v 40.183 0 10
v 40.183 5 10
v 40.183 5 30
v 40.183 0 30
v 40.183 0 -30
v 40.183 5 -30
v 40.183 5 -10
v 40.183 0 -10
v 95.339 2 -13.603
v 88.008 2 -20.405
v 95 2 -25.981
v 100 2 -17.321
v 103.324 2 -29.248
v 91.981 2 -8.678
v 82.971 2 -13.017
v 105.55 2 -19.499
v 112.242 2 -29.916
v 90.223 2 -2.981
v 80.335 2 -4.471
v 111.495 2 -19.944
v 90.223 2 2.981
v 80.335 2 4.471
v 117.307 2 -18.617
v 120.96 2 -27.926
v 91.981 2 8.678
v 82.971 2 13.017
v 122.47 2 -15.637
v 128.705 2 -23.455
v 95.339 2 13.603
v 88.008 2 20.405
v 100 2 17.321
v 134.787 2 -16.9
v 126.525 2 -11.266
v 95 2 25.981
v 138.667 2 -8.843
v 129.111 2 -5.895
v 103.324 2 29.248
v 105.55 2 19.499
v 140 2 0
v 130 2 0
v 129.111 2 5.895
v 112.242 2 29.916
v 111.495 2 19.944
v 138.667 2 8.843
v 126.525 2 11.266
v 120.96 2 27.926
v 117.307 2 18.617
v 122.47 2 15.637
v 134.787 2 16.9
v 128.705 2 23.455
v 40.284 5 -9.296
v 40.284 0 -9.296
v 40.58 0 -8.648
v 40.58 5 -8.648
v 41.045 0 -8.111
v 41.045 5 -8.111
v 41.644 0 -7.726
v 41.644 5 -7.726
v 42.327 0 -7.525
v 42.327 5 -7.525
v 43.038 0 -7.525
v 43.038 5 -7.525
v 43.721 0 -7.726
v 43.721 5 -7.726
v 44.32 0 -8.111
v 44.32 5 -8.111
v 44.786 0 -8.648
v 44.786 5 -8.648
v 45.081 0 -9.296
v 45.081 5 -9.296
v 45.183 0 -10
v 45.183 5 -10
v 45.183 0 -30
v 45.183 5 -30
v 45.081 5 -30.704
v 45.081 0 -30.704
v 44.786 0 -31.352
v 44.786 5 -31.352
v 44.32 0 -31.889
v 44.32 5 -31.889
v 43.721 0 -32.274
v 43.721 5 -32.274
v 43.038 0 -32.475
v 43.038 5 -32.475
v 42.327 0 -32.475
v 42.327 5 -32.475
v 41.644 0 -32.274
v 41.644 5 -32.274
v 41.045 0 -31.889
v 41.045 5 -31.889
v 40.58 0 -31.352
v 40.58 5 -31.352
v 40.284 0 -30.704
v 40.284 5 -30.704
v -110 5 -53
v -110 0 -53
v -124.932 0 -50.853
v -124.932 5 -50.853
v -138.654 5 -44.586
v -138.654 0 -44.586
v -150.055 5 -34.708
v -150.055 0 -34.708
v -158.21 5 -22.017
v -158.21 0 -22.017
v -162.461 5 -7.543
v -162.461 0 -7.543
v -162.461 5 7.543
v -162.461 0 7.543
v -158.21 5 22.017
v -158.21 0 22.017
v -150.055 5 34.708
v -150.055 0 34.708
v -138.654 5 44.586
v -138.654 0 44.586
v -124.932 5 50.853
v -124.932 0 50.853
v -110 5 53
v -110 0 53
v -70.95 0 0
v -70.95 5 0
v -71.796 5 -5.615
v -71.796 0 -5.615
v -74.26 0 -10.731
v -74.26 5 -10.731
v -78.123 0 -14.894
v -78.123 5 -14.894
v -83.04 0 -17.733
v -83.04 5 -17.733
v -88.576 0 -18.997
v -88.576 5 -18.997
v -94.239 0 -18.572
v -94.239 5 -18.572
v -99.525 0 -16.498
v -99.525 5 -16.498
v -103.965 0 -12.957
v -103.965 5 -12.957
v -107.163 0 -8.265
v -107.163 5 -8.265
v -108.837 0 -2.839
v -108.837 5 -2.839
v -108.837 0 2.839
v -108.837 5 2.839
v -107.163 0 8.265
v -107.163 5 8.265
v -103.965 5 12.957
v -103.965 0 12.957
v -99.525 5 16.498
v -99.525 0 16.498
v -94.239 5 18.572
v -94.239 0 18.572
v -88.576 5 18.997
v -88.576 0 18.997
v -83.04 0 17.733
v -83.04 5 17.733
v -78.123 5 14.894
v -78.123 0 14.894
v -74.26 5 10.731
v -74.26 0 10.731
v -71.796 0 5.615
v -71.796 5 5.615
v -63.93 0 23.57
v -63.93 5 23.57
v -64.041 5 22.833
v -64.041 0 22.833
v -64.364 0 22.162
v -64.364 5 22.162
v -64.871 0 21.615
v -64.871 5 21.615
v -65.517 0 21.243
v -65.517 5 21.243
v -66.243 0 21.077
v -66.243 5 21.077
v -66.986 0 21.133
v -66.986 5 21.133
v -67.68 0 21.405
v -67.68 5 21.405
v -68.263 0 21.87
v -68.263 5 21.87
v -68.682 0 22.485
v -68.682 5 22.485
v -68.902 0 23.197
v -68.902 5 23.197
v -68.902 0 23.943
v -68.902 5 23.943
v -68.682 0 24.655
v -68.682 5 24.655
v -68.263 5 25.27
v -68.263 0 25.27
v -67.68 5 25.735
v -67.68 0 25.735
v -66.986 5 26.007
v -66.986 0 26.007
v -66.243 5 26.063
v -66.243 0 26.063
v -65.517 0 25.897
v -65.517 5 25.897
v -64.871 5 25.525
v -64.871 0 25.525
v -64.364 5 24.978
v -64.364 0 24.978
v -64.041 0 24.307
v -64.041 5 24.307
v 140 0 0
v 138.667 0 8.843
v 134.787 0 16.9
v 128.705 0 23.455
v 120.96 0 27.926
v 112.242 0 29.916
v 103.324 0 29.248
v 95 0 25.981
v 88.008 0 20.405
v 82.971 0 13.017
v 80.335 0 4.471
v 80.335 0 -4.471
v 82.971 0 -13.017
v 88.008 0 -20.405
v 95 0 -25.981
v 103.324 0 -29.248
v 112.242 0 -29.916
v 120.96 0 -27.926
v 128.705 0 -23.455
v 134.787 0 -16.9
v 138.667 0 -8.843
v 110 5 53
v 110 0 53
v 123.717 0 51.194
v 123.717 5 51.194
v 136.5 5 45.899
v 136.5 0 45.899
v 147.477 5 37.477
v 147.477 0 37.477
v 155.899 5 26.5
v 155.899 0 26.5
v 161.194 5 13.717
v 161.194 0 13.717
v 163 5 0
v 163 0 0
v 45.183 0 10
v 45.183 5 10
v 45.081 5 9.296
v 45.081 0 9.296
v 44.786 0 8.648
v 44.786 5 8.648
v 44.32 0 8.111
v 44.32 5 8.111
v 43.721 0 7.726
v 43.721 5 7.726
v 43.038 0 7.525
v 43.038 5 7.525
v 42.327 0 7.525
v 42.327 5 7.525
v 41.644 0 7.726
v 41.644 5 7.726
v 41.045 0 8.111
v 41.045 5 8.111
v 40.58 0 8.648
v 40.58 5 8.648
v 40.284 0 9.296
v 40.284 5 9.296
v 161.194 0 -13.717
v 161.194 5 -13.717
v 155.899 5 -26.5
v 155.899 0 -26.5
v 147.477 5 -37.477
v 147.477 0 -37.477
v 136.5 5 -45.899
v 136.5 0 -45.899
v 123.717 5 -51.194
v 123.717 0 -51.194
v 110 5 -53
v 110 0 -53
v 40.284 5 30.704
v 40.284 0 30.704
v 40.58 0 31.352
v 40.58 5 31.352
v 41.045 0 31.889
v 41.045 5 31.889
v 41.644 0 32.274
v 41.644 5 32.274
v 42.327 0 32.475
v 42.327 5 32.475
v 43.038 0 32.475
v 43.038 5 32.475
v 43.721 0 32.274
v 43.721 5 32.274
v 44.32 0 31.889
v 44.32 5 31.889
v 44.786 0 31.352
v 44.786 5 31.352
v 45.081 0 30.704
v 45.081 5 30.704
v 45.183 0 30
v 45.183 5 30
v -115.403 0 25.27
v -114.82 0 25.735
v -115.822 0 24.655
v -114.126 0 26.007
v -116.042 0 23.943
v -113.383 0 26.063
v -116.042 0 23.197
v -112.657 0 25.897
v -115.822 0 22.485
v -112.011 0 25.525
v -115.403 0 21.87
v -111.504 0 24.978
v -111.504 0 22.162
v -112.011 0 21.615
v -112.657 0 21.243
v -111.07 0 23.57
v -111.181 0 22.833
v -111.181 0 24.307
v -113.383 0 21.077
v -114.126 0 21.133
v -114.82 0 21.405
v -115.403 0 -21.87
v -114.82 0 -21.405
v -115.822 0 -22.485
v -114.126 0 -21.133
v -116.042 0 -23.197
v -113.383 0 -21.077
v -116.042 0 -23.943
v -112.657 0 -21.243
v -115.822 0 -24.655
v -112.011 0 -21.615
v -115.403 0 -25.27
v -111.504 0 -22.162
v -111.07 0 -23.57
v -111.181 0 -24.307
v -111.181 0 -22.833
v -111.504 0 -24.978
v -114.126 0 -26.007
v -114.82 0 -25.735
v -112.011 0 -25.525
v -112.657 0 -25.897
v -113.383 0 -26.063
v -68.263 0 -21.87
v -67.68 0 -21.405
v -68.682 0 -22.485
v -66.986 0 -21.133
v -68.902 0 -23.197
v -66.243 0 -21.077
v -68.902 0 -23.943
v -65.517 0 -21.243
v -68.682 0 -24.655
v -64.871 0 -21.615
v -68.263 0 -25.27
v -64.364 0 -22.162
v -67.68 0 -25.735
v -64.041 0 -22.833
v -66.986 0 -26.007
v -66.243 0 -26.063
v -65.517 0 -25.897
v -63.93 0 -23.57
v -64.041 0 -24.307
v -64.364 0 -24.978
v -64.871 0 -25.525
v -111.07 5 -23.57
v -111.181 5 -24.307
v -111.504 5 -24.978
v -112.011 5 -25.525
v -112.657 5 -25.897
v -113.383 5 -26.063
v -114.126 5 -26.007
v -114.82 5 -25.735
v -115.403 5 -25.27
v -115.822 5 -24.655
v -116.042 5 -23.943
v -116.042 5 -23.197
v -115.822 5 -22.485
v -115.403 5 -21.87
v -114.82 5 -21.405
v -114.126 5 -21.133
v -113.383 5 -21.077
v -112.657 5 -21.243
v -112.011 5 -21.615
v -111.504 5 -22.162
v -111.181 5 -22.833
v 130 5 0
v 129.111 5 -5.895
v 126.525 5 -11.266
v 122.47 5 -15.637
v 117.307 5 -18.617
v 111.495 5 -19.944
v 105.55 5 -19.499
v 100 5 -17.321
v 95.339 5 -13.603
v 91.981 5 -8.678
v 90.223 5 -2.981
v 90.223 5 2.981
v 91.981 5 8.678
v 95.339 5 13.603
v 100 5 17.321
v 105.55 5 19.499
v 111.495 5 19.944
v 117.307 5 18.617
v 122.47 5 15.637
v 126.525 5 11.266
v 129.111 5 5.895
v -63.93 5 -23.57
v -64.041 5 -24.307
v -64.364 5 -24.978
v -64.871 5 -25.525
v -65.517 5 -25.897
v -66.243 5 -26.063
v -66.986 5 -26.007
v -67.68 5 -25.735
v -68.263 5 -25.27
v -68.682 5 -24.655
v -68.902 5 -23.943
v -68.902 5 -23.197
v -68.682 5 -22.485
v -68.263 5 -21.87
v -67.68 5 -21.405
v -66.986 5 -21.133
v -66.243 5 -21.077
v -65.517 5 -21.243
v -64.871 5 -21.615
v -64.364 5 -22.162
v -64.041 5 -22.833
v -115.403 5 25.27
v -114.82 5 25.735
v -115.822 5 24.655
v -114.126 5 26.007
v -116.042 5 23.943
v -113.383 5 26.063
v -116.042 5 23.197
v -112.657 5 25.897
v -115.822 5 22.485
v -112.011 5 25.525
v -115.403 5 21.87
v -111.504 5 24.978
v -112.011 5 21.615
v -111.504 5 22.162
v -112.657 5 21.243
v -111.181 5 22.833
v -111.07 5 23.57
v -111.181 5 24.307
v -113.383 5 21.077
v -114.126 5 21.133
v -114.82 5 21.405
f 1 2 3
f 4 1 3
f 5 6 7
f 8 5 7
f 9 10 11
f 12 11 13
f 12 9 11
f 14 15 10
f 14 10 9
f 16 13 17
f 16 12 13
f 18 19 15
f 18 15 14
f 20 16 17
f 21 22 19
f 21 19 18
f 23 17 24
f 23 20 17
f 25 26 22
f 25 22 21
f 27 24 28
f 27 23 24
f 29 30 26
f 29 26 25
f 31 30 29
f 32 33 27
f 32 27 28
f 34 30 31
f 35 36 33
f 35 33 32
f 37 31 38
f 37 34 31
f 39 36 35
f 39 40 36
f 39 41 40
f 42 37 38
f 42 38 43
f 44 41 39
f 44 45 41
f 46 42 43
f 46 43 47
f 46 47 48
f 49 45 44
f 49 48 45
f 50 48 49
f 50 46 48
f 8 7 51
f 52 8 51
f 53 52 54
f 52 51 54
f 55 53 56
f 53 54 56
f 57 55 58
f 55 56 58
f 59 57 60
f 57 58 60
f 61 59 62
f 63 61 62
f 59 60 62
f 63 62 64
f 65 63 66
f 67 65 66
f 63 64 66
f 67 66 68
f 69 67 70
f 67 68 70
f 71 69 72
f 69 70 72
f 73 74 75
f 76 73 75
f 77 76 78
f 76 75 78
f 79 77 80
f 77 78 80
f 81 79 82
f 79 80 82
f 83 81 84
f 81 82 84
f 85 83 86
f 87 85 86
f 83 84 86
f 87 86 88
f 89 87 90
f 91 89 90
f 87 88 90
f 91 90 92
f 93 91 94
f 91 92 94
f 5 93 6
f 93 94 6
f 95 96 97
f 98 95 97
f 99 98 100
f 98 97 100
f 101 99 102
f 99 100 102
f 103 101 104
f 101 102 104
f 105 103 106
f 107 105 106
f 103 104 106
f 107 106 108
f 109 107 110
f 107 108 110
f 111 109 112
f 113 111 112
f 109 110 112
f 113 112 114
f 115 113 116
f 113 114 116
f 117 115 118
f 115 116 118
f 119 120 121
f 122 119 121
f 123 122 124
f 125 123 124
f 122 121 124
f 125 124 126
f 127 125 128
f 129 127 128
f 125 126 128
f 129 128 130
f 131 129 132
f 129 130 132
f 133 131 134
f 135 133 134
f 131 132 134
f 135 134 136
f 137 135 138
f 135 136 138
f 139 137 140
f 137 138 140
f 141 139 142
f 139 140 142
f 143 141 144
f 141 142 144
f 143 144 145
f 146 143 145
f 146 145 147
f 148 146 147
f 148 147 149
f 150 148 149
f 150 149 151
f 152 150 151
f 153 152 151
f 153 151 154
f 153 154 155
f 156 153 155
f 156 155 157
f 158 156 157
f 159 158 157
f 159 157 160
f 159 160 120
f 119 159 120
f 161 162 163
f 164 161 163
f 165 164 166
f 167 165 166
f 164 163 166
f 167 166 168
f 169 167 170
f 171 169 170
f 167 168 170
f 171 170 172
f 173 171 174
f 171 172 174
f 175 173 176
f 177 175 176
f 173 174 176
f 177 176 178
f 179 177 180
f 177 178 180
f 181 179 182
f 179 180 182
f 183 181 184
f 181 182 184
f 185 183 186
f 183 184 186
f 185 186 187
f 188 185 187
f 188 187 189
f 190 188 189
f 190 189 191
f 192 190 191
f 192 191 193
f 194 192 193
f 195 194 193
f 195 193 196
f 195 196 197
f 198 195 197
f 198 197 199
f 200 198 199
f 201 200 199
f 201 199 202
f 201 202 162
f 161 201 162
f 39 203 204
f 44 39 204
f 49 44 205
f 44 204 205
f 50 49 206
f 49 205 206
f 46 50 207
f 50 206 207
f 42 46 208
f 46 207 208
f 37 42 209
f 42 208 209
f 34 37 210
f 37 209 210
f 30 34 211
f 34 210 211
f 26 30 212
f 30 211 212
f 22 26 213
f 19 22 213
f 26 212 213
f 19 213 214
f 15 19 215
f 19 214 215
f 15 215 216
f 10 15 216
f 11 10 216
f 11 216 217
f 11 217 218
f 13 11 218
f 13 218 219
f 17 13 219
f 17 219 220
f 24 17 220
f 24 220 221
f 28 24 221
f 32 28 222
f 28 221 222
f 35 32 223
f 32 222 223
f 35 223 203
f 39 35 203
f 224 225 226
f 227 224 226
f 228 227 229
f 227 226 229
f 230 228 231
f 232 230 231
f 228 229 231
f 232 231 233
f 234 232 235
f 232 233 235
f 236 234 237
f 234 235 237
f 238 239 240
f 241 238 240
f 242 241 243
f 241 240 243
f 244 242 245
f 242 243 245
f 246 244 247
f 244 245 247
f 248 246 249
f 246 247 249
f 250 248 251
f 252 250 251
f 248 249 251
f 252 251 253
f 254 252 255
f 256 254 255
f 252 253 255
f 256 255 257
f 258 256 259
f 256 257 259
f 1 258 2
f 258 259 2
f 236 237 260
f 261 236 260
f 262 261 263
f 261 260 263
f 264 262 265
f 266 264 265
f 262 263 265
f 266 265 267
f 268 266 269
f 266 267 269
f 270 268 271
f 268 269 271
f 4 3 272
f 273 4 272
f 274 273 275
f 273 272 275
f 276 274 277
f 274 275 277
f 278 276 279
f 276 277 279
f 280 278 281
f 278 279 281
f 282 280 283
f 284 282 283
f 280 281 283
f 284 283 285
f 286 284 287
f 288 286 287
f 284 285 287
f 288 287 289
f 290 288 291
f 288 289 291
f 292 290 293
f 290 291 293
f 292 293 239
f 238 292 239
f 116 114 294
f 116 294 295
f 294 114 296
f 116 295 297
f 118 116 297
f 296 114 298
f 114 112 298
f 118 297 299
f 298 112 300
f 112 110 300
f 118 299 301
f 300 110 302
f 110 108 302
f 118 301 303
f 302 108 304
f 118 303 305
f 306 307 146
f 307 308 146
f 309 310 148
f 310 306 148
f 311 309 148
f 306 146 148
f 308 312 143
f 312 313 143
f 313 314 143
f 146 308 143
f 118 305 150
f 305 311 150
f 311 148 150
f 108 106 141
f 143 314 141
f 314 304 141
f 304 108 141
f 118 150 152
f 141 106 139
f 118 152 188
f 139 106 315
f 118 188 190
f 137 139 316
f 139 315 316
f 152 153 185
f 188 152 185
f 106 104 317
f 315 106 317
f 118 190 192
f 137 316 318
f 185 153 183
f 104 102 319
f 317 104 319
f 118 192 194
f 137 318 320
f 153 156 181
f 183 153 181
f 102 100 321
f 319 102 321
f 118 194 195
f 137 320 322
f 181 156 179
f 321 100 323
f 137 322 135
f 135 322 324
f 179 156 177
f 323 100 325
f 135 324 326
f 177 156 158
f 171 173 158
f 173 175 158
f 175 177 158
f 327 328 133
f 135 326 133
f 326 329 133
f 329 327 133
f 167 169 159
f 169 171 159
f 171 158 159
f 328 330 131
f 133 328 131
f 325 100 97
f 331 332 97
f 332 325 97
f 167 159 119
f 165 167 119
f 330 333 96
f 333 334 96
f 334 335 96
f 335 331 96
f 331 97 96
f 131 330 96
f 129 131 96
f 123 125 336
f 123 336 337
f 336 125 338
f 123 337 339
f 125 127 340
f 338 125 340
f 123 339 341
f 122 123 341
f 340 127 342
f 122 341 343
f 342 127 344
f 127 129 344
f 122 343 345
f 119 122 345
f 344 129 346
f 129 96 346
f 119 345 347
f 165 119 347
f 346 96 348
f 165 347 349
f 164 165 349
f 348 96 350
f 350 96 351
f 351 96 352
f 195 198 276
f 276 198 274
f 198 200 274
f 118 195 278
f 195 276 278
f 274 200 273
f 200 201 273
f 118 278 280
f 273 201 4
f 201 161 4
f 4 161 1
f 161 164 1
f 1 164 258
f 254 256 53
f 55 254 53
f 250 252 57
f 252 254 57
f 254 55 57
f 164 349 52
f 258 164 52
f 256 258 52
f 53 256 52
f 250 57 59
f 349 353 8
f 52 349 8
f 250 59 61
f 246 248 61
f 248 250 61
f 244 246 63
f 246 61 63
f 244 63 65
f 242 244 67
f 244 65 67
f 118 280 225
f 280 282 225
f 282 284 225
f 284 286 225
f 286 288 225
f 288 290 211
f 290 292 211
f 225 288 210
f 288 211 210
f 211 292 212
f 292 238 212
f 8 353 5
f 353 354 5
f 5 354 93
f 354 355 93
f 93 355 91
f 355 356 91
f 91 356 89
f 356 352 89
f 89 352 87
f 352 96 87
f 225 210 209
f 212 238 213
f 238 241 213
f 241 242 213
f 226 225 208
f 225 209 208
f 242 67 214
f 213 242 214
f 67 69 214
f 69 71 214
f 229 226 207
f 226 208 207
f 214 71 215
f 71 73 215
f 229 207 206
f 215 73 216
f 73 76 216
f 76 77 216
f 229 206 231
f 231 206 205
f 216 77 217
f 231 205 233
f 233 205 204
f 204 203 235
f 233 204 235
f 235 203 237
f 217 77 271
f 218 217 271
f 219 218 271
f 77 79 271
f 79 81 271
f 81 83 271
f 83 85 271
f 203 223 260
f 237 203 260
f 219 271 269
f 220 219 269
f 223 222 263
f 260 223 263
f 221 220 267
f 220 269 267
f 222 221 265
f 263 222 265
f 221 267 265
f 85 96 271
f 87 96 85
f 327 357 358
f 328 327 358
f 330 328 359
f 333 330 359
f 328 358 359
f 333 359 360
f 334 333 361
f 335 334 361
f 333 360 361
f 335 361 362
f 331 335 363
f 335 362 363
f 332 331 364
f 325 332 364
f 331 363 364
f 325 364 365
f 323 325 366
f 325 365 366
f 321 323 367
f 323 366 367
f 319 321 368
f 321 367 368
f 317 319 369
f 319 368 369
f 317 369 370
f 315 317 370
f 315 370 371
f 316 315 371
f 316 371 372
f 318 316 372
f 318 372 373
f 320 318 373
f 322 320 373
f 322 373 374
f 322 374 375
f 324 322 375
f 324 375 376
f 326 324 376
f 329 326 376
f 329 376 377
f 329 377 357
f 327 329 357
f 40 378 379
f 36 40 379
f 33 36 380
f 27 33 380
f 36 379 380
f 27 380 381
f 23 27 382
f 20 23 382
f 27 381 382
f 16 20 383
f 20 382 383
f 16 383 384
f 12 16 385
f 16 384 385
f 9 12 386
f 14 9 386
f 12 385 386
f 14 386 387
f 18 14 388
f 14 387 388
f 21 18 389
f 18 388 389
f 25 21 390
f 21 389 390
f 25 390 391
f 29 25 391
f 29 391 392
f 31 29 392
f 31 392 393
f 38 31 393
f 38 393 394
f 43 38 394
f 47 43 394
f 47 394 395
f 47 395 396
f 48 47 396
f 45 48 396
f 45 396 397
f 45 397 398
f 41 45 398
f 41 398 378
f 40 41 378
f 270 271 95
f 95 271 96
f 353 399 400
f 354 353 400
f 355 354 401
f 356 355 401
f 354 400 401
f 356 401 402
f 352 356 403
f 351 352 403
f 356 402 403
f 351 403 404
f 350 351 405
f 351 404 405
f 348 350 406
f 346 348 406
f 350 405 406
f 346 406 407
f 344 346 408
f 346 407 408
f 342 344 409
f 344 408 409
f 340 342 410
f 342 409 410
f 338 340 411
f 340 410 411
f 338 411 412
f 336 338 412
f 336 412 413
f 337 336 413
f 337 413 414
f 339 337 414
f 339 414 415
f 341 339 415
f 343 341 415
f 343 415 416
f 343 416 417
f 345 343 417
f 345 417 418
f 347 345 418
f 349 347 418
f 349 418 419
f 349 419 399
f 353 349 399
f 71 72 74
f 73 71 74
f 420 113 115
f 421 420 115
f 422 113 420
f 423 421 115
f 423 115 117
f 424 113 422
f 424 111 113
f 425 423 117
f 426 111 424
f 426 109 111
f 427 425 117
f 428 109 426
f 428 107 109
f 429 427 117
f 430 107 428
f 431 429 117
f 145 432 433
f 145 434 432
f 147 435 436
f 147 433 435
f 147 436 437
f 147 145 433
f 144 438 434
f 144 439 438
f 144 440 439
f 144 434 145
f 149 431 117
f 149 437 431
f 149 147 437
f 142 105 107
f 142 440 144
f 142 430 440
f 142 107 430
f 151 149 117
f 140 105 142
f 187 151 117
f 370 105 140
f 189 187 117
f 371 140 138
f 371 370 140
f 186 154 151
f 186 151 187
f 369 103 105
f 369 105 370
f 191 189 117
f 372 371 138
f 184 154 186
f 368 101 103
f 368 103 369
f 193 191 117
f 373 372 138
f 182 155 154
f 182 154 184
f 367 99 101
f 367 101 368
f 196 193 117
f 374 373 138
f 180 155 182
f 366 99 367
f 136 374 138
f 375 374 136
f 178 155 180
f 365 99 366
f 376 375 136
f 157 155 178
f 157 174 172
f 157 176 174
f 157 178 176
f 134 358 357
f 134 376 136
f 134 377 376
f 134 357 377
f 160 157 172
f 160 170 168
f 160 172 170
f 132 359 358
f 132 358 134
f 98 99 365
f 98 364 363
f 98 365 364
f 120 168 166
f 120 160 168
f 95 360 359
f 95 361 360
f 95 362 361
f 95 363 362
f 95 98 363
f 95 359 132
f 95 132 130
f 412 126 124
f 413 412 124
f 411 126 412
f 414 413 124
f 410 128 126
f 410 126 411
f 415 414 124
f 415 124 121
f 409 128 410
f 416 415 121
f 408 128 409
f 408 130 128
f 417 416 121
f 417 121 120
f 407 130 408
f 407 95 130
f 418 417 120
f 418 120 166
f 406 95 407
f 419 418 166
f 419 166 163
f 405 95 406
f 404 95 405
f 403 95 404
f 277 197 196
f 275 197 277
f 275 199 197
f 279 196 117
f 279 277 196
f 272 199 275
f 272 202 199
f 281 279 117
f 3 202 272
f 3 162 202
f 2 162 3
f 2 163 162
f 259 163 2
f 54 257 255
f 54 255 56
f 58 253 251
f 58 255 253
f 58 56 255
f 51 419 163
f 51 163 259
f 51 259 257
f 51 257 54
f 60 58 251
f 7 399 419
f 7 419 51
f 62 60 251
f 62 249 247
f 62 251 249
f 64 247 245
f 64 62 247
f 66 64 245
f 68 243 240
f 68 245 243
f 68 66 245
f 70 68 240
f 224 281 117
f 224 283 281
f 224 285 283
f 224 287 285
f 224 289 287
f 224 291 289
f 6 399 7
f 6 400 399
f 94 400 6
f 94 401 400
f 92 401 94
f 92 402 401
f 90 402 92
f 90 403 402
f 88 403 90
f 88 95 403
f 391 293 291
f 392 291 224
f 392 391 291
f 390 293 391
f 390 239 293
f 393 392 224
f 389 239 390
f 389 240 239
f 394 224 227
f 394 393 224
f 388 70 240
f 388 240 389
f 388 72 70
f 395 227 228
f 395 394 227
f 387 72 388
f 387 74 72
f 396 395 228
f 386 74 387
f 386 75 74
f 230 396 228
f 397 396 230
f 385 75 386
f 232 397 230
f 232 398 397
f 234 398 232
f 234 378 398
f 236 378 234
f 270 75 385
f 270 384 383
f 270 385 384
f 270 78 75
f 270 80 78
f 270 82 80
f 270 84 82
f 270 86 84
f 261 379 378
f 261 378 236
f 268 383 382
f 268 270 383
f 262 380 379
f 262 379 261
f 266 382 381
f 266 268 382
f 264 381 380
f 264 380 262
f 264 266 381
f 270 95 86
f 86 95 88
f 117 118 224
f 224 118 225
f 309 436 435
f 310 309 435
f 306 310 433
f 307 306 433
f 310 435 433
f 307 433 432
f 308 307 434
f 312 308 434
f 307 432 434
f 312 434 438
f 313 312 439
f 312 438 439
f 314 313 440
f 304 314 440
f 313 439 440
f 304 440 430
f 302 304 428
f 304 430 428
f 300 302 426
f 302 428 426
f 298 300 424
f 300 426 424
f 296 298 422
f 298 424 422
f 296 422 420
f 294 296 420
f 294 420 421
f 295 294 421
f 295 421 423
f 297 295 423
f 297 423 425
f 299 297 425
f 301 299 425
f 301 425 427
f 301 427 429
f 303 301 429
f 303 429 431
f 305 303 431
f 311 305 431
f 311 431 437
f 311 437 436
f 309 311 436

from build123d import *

# Parameters (mm, degrees)
BOSS_EXTRUDE1_DEPTH = 5
SKETCH2_R           = 20
CUT_EXTRUDE1_DEPTH  = 6
SKETCH3_R           = 30
CUT_EXTRUDE2_DEPTH  = 2
SKETCH4_R           = 2.5
SKETCH4_R_2         = 19.05
CUT_EXTRUDE3_DEPTH  = 6


with BuildPart() as part:
    # Sketch1 → Boss-Extrude1 (new body)
    with BuildSketch(Plane(origin=(0, 0, 0), x_dir=(1, 0, 0), z_dir=(0, 1, 0))):
        with BuildLine():
            ThreePointArc((-110, 53), (-163, 0), (-110, -53))
            Line((-110, -53), (-110, 53))
        make_face()
        with BuildLine():
            Line((-110, 53), (-110, -53))
            ThreePointArc((-110, -53), (-72.523340597, -37.476659403), (-57, 0))
            ThreePointArc((-57, 0), (-72.523340597, 37.476659403), (-110, 53))
        make_face()
        with BuildLine():
            ThreePointArc((-57, 0), (-72.523340597, -37.476659403), (-110, -53))
            Line((-110, -53), (110, -53))
            ThreePointArc((110, -53), (57, 0), (110, 53))
            Line((110, 53), (-110, 53))
            ThreePointArc((-110, 53), (-72.523340597, 37.476659403), (-57, 0))
        make_face()
        with BuildLine():
            ThreePointArc((110, 53), (57, 0), (110, -53))
            Line((110, -53), (110, 53))
        make_face()
        with BuildLine():
            Line((110, 53), (110, -53))
            ThreePointArc((110, -53), (147.476659403, -37.476659403), (163, 0))
            ThreePointArc((163, 0), (147.476659403, 37.476659403), (110, 53))
        make_face()
    extrude(amount=BOSS_EXTRUDE1_DEPTH)

    # Sketch2 → Cut-Extrude1 (cut, through all)
    with BuildSketch(Plane(origin=(0, 5, 0), x_dir=(1, 0, 0), z_dir=(0, 1, 0))):
        with Locations((110, 0)):
            Circle(SKETCH2_R)
    extrude(amount=-CUT_EXTRUDE1_DEPTH, mode=Mode.SUBTRACT)

    # Sketch3 → Cut-Extrude2 (cut)
    with BuildSketch(Plane.XZ):
        with Locations((110, 0)):
            Circle(SKETCH3_R)
    extrude(amount=-CUT_EXTRUDE2_DEPTH, mode=Mode.SUBTRACT)

    # Sketch4 → Cut-Extrude3 (cut, through all)
    with BuildSketch(Plane(origin=(0, 5, 0), x_dir=(1, 0, 0), z_dir=(0, 1, 0))):
        with Locations((-113.57, 23.57)):
            Circle(SKETCH4_R)
        with Locations((-66.43, 23.57)):
            Circle(SKETCH4_R)
        with Locations((-66.43, -23.57)):
            Circle(SKETCH4_R)
        with Locations((-113.57, -23.57)):
            Circle(SKETCH4_R)
        with Locations((-90, 0)):
            Circle(SKETCH4_R_2)
        with BuildLine():
            Line((45.182638641, 10), (45.182638641, 30))
            ThreePointArc((45.182638641, 30), (42.682638641, 32.5), (40.182638641, 30))
            Line((40.182638641, 30), (40.182638641, 10))
            ThreePointArc((40.182638641, 10), (42.682638641, 7.5), (45.182638641, 10))
        make_face()
        with BuildLine():
            Line((40.182638641, -10), (40.182638641, -30))
            ThreePointArc((40.182638641, -30), (42.682638641, -32.5), (45.182638641, -30))
            Line((45.182638641, -30), (45.182638641, -10))
            ThreePointArc((45.182638641, -10), (42.682638641, -7.5), (40.182638641, -10))
        make_face()
    extrude(amount=-CUT_EXTRUDE3_DEPTH, mode=Mode.SUBTRACT)


solid = part.part
